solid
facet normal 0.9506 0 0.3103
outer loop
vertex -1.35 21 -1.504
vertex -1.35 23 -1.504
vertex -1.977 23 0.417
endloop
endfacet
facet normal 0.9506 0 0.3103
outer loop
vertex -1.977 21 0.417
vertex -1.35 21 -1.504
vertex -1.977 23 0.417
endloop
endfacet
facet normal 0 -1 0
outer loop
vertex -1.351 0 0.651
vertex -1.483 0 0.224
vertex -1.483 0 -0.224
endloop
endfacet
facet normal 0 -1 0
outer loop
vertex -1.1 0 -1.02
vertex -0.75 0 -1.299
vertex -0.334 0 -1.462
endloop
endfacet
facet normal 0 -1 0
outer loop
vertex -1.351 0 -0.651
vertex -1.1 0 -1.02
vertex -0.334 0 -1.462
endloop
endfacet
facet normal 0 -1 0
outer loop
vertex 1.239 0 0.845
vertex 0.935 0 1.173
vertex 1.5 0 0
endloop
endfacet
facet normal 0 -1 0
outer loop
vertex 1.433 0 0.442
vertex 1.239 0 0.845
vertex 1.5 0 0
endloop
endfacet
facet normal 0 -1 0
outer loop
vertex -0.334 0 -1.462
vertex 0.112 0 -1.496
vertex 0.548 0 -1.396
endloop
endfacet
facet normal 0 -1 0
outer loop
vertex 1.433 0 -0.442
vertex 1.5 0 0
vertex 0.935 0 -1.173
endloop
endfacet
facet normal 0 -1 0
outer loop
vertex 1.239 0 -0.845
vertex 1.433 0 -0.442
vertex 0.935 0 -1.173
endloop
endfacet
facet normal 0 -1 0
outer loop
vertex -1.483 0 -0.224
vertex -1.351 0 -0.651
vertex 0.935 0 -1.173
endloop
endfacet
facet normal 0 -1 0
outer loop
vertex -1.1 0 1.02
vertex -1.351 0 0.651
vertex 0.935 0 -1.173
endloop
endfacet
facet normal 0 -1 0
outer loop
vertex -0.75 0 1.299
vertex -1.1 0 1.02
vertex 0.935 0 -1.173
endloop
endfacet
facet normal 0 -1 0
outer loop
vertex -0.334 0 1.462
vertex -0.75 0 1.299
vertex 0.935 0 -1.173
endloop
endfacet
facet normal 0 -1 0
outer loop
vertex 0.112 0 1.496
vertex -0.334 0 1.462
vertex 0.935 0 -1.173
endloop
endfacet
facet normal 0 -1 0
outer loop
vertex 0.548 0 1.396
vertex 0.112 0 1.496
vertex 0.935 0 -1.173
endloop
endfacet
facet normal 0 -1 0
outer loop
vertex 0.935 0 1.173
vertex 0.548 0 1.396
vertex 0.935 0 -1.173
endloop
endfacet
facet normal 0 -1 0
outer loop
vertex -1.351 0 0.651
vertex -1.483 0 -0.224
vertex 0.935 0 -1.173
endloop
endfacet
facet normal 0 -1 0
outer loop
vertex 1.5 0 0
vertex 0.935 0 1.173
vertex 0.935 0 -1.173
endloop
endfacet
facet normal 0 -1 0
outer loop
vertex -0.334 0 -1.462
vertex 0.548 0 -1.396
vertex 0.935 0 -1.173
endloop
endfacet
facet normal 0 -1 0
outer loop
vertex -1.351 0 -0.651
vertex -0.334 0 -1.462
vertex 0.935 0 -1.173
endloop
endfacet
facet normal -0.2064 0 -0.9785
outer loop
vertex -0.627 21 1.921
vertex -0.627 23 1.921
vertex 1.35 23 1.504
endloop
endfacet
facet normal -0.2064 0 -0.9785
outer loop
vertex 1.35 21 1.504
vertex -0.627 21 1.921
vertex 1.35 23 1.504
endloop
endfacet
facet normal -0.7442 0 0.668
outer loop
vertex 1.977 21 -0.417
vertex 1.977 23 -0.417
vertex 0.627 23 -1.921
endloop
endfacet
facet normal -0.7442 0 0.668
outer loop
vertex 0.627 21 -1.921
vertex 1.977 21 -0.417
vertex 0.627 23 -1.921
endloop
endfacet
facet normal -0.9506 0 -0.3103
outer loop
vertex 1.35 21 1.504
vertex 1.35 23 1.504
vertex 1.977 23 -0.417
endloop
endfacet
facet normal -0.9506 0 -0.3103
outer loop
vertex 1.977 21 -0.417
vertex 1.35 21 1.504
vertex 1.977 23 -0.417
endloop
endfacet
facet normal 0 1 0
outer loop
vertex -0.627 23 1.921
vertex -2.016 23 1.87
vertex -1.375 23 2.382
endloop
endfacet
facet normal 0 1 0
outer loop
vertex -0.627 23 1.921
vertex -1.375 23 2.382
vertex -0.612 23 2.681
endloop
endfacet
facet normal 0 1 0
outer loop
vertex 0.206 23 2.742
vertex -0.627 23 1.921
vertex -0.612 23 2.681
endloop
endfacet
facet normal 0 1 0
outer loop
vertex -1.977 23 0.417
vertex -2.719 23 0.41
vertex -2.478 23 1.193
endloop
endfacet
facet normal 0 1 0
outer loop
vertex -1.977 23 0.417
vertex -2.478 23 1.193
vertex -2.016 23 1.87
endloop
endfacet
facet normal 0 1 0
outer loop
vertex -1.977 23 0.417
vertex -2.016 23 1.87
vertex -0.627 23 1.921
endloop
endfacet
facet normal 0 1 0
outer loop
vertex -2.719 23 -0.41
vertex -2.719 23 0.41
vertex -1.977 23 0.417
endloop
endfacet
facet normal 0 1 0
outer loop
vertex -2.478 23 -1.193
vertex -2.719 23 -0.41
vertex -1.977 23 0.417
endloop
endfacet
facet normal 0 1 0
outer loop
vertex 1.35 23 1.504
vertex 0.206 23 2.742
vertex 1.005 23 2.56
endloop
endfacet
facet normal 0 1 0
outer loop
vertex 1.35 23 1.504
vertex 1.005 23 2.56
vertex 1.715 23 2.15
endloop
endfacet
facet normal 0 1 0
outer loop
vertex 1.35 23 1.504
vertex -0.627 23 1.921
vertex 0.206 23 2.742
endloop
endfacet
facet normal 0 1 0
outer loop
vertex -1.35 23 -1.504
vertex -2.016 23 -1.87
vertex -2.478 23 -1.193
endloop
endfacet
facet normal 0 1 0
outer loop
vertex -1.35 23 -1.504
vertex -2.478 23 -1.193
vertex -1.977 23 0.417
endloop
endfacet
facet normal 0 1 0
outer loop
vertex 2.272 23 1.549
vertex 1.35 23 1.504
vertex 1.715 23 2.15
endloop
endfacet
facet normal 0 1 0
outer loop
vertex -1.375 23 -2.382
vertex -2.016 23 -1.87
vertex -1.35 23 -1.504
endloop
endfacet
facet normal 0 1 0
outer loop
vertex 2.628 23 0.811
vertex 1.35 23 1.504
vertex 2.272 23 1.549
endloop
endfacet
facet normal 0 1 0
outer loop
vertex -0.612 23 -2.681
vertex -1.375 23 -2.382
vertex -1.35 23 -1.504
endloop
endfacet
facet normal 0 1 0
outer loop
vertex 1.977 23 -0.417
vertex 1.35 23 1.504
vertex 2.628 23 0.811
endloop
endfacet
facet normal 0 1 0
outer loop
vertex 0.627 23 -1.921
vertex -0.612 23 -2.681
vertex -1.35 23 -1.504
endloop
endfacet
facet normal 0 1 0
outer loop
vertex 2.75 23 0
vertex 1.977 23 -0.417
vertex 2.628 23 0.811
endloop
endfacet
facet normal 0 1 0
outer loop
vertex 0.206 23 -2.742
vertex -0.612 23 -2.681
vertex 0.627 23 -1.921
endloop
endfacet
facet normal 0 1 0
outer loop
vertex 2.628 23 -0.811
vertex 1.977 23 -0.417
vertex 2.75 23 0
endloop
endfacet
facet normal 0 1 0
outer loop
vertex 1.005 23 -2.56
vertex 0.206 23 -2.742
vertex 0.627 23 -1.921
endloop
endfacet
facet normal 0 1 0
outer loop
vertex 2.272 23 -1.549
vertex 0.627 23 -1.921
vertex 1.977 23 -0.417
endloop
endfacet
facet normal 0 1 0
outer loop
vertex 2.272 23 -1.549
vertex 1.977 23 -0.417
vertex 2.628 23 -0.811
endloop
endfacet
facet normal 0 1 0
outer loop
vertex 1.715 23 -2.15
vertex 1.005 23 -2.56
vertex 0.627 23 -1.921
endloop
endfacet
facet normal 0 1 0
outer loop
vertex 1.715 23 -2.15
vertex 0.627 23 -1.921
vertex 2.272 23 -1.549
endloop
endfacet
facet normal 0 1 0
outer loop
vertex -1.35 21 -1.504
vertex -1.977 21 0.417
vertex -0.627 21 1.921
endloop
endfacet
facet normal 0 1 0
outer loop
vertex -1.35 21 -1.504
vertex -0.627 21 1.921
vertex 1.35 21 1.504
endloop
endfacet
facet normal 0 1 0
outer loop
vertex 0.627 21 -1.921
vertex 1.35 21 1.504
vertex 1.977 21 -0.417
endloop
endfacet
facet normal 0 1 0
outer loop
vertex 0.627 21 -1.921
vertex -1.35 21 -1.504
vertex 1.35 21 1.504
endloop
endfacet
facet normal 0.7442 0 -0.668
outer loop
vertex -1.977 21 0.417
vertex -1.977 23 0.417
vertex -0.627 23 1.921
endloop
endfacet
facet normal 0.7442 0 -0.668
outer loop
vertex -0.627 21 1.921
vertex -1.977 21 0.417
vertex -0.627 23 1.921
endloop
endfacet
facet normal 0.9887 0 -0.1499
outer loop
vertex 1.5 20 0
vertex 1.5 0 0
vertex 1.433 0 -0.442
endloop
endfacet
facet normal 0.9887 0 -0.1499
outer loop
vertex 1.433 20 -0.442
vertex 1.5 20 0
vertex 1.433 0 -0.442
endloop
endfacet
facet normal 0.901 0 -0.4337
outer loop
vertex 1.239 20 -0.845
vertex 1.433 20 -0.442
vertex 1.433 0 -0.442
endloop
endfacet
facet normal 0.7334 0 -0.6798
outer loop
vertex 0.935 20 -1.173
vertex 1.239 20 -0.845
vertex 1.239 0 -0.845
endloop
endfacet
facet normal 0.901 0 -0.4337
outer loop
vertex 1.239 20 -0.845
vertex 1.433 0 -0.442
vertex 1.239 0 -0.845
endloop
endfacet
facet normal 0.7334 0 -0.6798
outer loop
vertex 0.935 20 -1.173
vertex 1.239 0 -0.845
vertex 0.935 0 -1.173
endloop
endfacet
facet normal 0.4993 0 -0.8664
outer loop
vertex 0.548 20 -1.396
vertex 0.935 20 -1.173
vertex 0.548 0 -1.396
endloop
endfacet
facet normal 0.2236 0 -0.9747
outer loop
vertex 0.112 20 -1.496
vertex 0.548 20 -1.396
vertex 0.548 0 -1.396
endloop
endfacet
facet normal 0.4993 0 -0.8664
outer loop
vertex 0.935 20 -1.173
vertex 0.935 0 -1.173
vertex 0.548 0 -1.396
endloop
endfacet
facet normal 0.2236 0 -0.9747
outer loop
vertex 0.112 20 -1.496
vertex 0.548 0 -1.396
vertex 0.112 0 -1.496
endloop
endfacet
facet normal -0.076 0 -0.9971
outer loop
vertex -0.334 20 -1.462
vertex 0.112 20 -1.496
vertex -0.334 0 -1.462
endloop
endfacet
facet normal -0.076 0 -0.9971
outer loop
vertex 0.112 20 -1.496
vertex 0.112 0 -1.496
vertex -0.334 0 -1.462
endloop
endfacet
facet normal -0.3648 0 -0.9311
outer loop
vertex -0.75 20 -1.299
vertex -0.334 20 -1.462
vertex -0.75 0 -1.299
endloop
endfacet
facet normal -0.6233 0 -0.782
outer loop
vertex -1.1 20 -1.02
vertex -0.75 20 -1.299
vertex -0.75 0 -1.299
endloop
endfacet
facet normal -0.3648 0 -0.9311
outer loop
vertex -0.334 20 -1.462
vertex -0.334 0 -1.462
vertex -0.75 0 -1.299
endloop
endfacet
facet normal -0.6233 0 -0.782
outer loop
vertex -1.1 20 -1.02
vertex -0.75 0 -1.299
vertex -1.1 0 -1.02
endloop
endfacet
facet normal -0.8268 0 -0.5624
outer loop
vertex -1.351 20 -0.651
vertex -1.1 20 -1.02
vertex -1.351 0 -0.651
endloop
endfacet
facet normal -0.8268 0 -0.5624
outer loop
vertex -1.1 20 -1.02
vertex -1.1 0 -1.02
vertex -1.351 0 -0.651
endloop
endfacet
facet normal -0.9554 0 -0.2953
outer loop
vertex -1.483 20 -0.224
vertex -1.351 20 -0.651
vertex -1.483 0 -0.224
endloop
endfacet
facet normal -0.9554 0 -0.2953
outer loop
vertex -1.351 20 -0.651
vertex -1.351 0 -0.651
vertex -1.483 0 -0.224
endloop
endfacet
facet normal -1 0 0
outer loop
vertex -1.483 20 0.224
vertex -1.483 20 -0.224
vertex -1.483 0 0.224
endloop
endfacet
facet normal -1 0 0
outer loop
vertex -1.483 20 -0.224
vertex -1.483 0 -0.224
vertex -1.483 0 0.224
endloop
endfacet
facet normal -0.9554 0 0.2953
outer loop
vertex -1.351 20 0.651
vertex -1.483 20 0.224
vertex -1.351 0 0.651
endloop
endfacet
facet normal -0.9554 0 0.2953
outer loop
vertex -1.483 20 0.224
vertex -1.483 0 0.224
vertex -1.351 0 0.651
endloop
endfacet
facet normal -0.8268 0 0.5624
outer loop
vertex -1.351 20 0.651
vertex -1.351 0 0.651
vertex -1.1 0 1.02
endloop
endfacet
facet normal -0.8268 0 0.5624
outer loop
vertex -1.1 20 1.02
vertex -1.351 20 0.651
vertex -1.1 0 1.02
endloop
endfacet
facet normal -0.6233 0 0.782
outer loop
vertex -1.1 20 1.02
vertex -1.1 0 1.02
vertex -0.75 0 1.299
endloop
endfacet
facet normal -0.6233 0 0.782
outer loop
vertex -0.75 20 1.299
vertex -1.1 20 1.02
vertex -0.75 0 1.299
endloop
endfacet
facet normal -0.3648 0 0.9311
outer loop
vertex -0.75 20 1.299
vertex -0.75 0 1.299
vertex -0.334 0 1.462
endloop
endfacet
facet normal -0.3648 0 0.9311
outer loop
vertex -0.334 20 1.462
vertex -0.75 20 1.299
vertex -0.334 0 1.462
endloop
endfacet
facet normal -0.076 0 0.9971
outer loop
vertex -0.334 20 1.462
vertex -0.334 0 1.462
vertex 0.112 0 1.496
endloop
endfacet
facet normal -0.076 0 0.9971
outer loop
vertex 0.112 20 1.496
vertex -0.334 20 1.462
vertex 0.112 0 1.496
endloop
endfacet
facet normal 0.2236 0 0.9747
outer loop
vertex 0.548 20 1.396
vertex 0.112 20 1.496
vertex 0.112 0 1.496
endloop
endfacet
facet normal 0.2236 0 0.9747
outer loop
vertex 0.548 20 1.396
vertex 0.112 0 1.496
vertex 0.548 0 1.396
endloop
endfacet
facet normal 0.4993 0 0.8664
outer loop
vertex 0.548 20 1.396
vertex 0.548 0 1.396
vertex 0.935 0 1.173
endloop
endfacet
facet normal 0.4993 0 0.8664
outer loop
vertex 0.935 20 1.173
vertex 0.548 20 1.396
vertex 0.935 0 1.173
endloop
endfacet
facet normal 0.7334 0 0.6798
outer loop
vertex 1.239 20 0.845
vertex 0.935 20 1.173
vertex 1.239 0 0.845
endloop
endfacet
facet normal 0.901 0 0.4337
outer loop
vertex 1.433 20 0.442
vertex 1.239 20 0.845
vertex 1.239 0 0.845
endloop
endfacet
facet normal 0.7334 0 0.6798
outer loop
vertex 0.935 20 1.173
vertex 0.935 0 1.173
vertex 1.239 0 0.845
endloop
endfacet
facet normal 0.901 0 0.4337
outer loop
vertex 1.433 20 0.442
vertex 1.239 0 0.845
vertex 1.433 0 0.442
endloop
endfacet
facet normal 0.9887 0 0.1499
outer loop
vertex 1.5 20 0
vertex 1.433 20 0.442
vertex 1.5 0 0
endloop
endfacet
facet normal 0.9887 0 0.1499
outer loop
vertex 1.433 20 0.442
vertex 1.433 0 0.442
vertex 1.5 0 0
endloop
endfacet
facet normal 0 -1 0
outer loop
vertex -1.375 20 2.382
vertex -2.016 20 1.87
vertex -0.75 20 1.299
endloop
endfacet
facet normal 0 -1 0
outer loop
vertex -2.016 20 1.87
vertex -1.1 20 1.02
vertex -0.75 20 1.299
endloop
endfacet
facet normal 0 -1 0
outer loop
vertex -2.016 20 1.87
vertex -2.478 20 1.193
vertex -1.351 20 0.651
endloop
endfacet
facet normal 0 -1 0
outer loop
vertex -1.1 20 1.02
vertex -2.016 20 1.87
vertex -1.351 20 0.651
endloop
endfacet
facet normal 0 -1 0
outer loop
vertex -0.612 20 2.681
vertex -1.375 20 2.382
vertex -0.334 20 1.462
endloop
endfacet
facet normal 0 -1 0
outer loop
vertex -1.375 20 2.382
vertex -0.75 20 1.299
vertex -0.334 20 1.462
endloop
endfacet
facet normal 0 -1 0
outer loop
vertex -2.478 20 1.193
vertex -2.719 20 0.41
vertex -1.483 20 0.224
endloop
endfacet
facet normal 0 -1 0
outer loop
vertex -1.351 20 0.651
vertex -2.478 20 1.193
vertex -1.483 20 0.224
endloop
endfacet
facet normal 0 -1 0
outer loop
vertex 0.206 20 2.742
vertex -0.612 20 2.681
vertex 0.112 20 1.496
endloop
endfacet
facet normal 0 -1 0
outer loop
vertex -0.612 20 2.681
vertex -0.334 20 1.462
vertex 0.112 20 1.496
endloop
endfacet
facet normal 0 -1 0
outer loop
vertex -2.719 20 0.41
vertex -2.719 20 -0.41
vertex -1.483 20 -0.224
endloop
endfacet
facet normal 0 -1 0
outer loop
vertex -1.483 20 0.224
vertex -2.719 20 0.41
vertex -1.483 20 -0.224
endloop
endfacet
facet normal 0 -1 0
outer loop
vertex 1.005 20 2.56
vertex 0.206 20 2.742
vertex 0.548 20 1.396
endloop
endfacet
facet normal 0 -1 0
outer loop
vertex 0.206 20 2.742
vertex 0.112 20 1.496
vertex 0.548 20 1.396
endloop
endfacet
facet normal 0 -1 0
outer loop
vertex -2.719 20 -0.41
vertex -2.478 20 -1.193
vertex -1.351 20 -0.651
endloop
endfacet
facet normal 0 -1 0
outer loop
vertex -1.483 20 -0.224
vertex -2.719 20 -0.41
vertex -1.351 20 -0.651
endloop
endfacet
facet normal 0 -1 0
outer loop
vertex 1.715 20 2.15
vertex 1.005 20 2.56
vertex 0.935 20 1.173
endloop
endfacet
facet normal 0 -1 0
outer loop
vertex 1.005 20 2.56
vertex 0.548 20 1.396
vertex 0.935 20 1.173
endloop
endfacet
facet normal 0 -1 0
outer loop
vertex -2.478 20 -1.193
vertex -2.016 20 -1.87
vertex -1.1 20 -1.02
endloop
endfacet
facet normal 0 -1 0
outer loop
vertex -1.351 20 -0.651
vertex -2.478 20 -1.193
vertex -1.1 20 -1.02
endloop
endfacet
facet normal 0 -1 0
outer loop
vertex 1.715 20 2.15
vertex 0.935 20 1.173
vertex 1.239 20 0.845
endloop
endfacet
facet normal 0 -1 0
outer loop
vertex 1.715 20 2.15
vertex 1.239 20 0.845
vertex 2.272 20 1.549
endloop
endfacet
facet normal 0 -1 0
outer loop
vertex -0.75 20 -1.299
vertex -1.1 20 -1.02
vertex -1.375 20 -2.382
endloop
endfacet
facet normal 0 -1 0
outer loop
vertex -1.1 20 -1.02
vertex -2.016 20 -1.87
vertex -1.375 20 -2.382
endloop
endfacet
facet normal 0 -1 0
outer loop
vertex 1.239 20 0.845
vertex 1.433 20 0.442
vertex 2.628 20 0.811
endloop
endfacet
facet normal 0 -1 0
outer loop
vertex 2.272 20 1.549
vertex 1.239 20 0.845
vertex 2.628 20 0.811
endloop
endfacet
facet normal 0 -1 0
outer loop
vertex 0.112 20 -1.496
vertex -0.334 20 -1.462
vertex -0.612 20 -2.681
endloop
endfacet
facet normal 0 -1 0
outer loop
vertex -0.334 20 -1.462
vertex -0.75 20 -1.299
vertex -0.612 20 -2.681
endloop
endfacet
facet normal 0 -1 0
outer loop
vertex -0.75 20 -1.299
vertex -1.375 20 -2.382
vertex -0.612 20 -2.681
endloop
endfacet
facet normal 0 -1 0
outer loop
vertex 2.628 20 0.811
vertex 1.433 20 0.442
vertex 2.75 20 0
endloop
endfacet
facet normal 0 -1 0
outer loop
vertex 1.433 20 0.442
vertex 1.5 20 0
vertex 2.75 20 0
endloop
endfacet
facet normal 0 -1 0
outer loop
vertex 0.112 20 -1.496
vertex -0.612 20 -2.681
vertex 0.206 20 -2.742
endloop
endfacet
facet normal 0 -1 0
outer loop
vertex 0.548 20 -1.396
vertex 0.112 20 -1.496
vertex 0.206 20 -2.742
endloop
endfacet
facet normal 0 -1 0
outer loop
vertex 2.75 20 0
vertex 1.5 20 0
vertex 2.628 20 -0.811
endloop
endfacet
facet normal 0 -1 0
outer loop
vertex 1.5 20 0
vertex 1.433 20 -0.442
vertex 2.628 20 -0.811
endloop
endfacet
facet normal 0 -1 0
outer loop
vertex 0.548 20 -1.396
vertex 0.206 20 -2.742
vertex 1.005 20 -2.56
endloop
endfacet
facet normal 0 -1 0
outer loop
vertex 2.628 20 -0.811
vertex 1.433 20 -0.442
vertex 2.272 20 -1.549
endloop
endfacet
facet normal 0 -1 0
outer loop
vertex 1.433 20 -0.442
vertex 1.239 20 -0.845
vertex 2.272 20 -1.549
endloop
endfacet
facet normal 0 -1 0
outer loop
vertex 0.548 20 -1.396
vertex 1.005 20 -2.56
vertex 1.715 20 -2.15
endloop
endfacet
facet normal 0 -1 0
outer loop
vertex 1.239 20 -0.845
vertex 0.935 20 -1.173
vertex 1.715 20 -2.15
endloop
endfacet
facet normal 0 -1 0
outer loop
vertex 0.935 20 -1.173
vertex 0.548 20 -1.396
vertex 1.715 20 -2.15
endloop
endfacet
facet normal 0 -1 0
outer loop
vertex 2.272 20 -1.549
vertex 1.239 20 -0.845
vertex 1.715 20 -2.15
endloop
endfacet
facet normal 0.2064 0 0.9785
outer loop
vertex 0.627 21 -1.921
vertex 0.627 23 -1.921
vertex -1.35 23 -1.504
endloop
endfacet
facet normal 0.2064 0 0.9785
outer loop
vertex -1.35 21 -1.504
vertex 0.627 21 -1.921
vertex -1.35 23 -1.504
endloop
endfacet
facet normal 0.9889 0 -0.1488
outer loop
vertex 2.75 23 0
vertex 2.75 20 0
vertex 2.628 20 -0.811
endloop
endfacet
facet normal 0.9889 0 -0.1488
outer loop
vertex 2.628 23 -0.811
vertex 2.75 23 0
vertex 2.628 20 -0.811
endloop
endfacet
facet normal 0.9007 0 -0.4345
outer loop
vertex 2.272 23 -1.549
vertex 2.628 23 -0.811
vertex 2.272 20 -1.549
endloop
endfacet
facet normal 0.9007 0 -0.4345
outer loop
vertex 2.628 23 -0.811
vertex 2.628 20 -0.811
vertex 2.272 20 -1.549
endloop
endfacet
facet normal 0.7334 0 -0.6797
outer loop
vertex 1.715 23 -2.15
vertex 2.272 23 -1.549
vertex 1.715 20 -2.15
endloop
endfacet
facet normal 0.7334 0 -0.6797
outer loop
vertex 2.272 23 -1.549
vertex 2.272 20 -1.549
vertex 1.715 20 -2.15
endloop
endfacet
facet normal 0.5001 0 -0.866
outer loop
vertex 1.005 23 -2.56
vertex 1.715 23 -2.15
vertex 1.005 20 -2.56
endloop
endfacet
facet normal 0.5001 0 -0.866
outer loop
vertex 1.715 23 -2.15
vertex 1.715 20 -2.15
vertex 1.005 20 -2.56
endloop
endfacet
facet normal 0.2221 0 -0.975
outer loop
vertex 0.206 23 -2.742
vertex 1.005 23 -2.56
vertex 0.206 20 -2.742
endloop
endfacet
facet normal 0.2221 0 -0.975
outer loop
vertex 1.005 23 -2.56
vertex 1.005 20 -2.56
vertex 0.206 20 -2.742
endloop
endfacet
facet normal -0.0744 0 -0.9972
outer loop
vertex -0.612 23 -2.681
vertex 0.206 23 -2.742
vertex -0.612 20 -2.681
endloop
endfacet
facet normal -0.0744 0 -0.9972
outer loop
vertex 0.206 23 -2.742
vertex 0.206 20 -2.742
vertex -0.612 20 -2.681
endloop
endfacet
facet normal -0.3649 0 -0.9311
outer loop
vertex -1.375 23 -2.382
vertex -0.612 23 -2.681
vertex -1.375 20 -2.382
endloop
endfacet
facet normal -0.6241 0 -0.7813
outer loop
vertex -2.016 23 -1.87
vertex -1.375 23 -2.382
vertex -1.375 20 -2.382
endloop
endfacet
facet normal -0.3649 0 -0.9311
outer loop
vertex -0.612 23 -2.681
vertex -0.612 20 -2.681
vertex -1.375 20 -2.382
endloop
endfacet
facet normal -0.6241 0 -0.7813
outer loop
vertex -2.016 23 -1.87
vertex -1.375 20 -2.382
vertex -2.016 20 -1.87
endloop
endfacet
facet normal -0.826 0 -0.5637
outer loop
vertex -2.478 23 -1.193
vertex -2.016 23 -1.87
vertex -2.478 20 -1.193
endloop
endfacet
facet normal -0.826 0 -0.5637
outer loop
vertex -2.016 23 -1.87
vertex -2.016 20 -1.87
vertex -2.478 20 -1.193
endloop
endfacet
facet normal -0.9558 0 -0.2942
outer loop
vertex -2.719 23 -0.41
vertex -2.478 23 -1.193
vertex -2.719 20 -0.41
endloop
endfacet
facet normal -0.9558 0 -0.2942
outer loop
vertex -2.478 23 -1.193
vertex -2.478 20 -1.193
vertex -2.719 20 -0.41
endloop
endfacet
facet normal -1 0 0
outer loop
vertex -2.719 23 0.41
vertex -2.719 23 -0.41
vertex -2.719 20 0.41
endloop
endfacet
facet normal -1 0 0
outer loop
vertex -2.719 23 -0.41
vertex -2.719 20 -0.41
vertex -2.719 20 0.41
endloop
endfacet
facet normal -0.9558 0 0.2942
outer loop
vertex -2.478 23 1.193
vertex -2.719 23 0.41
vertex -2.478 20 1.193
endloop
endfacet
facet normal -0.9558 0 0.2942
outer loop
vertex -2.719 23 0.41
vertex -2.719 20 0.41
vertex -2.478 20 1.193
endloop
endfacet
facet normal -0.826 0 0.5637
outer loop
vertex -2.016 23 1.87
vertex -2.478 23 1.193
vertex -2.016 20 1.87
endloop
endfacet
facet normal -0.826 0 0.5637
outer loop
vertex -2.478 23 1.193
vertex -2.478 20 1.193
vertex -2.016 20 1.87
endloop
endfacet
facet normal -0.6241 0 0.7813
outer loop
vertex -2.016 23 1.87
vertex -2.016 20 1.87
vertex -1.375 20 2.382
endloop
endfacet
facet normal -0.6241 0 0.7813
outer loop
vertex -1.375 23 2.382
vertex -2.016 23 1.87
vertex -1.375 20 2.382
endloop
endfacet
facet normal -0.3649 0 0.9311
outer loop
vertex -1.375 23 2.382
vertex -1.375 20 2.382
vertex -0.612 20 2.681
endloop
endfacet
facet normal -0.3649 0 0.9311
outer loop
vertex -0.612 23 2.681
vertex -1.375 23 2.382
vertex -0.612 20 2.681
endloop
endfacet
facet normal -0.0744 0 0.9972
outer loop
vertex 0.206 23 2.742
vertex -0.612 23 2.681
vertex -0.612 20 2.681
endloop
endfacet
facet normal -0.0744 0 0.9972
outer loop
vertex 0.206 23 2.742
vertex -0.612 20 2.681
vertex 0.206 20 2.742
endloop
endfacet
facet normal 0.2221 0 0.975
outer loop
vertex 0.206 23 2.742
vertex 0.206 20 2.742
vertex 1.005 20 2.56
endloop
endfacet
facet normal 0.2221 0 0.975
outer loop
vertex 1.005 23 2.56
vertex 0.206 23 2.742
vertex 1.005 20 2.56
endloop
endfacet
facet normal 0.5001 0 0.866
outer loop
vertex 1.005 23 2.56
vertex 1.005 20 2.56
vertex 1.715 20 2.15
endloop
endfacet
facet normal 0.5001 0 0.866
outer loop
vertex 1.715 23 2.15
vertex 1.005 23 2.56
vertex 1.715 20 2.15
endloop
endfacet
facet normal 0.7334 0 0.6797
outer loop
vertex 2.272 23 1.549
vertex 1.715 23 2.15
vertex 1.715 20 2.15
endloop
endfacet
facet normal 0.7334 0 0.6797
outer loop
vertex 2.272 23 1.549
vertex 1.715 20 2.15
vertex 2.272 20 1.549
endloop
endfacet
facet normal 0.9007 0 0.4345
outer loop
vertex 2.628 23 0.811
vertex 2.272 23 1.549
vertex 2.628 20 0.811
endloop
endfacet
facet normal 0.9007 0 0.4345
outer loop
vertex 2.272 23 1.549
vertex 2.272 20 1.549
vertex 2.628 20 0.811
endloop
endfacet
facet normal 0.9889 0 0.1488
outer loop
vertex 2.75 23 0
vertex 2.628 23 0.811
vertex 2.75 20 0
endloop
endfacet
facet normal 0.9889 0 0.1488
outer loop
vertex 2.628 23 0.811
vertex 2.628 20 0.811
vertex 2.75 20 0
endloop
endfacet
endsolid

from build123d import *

# Parameters (mm, degrees)
SKETCH1_R           = 1.5
BOSS_EXTRUDE1_DEPTH = 20
SKETCH2_R           = 2.75
BOSS_EXTRUDE2_DEPTH = 3
CUT_EXTRUDE1_DEPTH  = 2


with BuildPart() as part:
    # Sketch1 → Boss-Extrude1 (new body)
    with BuildSketch(Plane(origin=(0, 0, 0), x_dir=(1, 0, 0), z_dir=(0, 1, 0))):
        Circle(SKETCH1_R)
    extrude(amount=BOSS_EXTRUDE1_DEPTH)

    # Sketch2 → Boss-Extrude2 (add)
    with BuildSketch(Plane(origin=(0, 20, 0), x_dir=(1, 0, 0), z_dir=(0, 1, 0))):
        Circle(SKETCH2_R)
    extrude(amount=BOSS_EXTRUDE2_DEPTH)

    # Sketch4 → Cut-Extrude1 (cut)
    with BuildSketch(Plane(origin=(0, 23, 0), x_dir=(1, 0, 0), z_dir=(0, 1, 0))):
        Polygon((1.977155875, 0.417358336), (0.627135016, 1.920946383), (-1.350020859, 1.503588046), (-1.977155875, -0.417358336), (-0.627135016, -1.920946383), (1.350020859, -1.503588046), align=None)
    extrude(amount=-CUT_EXTRUDE1_DEPTH, mode=Mode.SUBTRACT)


solid = part.part
